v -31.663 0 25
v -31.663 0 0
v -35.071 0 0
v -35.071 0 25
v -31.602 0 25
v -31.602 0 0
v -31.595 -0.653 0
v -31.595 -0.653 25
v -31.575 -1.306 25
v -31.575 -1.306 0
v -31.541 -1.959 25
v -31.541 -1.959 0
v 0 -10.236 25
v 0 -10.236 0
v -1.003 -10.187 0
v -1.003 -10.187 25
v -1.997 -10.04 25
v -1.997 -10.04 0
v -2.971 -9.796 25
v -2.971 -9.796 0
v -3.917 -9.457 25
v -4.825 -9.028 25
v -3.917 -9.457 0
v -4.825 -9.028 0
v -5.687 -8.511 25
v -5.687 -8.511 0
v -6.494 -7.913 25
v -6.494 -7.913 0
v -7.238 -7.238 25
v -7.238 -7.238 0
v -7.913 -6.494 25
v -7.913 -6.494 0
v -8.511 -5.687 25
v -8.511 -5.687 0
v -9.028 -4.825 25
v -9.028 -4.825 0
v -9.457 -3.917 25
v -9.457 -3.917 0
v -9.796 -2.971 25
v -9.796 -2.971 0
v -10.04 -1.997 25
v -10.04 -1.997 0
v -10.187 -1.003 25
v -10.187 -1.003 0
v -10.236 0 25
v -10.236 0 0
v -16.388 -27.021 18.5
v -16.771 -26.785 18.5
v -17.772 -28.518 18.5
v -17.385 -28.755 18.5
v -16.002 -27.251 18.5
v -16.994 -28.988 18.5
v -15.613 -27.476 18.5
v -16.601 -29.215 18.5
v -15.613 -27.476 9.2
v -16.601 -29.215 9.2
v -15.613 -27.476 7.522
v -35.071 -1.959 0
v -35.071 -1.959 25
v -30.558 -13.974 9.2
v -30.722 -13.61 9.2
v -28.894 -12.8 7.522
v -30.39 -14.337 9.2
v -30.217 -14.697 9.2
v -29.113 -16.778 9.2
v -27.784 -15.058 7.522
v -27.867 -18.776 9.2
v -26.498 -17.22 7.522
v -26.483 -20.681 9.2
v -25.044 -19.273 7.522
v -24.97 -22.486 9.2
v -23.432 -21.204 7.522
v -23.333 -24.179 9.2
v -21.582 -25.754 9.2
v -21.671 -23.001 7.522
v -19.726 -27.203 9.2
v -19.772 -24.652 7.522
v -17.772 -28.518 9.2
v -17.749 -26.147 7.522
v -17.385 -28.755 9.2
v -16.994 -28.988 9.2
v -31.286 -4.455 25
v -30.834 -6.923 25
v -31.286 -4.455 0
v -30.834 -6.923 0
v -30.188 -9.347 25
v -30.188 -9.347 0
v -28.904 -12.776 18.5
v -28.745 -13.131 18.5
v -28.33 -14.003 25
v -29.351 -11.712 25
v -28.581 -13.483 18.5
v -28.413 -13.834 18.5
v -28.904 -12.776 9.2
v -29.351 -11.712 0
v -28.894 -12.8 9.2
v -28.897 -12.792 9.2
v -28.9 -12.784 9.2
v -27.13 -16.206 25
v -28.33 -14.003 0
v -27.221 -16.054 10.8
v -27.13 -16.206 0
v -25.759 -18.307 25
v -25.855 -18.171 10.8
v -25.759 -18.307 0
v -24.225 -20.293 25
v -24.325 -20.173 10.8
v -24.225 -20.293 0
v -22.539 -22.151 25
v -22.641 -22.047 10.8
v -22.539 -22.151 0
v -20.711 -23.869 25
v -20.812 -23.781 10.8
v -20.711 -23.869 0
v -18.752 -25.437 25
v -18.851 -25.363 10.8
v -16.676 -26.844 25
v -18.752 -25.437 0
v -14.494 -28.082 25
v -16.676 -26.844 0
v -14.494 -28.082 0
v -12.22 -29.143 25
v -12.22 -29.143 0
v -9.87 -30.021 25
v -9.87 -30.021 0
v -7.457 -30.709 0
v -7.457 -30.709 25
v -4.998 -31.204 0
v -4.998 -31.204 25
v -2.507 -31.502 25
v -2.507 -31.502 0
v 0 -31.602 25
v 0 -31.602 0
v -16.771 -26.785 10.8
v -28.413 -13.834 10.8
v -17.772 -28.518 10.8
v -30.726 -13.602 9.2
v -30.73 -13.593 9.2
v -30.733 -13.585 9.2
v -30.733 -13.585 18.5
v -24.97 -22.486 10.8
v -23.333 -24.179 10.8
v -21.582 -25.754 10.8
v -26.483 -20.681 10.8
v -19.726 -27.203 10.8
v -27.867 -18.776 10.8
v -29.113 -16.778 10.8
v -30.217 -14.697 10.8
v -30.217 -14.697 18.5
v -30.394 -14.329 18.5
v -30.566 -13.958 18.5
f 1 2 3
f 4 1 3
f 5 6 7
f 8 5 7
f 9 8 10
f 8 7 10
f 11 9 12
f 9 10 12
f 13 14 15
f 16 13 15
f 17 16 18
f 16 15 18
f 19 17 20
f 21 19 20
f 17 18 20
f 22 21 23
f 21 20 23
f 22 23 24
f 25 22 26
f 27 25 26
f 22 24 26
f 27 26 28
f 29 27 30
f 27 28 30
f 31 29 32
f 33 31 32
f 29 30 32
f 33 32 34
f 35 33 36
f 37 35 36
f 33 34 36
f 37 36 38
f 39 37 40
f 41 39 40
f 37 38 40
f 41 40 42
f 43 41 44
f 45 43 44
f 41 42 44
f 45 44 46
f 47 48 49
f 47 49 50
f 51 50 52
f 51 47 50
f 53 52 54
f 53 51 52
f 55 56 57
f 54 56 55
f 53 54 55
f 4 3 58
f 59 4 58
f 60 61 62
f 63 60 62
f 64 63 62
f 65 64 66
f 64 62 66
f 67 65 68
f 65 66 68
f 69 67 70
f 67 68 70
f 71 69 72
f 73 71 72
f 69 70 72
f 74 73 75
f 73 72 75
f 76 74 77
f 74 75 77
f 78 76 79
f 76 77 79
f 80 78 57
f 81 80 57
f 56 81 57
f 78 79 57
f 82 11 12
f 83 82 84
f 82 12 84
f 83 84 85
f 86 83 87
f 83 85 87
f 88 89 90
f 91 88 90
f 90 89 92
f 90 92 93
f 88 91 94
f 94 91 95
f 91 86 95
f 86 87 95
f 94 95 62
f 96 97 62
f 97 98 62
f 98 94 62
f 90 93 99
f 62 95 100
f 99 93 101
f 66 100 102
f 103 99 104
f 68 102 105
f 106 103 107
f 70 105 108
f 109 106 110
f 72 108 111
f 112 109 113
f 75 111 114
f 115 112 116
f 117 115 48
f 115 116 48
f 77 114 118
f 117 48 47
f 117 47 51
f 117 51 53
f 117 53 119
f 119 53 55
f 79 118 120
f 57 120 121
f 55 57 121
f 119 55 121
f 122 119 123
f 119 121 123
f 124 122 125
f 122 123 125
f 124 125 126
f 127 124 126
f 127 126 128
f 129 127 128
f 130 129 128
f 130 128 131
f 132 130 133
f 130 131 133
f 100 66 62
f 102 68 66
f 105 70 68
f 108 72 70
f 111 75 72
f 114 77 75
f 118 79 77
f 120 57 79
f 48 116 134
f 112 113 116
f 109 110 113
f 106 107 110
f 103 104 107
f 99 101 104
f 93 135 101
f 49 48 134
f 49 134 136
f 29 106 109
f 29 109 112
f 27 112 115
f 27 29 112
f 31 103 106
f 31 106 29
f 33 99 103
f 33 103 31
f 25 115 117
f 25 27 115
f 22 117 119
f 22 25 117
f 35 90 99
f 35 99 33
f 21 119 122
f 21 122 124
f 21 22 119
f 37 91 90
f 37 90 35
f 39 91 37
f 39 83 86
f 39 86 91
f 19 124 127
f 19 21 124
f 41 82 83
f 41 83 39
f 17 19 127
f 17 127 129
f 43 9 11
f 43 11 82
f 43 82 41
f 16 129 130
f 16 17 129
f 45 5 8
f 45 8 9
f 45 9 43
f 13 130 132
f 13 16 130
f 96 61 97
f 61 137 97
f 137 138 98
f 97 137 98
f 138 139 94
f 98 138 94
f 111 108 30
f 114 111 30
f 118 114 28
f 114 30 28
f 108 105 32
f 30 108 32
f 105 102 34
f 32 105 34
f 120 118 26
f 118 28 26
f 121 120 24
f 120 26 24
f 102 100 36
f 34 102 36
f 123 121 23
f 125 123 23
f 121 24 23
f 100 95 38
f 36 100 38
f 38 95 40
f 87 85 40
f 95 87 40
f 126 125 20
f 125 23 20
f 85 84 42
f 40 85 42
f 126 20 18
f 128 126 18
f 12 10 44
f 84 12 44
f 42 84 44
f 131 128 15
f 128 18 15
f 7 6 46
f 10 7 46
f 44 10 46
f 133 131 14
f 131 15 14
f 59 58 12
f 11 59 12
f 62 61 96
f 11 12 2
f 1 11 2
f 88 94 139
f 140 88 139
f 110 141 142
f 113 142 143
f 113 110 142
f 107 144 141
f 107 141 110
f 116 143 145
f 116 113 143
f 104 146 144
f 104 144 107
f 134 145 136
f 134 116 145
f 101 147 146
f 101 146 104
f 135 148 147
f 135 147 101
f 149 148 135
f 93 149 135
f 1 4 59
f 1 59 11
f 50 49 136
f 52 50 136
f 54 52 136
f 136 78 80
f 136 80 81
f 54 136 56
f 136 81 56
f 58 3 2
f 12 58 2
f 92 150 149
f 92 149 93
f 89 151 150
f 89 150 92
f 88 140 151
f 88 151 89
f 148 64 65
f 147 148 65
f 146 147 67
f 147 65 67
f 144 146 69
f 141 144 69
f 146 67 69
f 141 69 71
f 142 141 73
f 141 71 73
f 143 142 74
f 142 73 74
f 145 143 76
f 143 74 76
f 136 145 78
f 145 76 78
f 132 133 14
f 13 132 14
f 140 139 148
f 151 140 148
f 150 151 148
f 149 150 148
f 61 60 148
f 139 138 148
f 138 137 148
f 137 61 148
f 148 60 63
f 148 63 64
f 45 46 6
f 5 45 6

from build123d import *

# Parameters (mm, degrees)
F1_DEPTH       = 25
F4_DEPTH       = 1.6
F5_DEPTH       = 9.3
F8_ANGLE_START = 323.5
F8_ANGLE       = 36.5


# Not quite as in the source:
# - a feature names something its author has since deleted; it is built from what else it names


with BuildPart() as f1:
    # F0 (on Top) → F1 (new body)
    with BuildSketch(Plane.XY):
        Polygon((-31.6627237999, 0), (-35.0708141923, 0), (-35.0708141923, -1.9589243457), (-31.5410606563, -1.9589243457), align=None)
    extrude(amount=F1_DEPTH)


with BuildPart() as f1b:
    # F0 (on Top) → F1, piece 2 (new body)
    with BuildSketch(Plane.XY):
        with BuildLine():
            Line((-10.2362729305, 0), (-31.6018336797, 0))
            ThreePointArc((-31.6018336797, 0), (-31.5866367698, -0.97993341), (-31.5410606563, -1.9589243457))
            ThreePointArc((-31.5410606563, -1.9589243457), (-21.6422074955, -23.0280426142), (0, -31.6018336797))
            Line((0, -31.6018336797), (0, -10.2362729305))
            ThreePointArc((0, -10.2362729305), (-7.2381380033, -7.2381380033), (-10.2362729305, 0))
        make_face()
    extrude(amount=F1_DEPTH)

    # F3 (on offset) → F4 (join)
    with BuildSketch(Plane.XY.offset(9.2)):
        with BuildLine():
            Line((-28.9039363578, -12.7764766248), (-30.7331932706, -13.5850674651))
            ThreePointArc((-30.7331932706, -13.5850674651), (-30.4802346772, -14.1434974691), (-30.2171302851, -14.6972196))
            Line((-30.2171302851, -14.6972196), (-28.4130525281, -13.8338114038))
            ThreePointArc((-28.4130525281, -13.8338114038), (-28.66337023, -13.307407673), (-28.9039363578, -12.7764766248))
        make_face()
        with BuildLine():
            Line((-28.4130525281, -13.8338114038), (-30.2171302851, -14.6972196))
            ThreePointArc((-30.2171302851, -14.6972196), (-24.9696289489, -22.4855699681), (-17.771706088, -28.5175330167))
            Line((-17.771706088, -28.5175330167), (-16.7706750146, -26.7847036846))
            ThreePointArc((-16.7706750146, -26.7847036846), (-23.5015682749, -21.1270485524), (-28.4130525281, -13.8338114038))
        make_face()
        with BuildLine():
            Line((-16.7706750146, -26.7847036846), (-17.771706088, -28.5175330167))
            ThreePointArc((-17.771706088, -28.5175330167), (-17.1897915571, -28.8720330573), (-16.6008083436, -29.2146605144))
            Line((-16.6008083436, -29.2146605144), (-15.6127189136, -27.4757875236))
            ThreePointArc((-15.6127189136, -27.4757875236), (-16.1953835952, -27.1364227952), (-16.7706750146, -26.7847036846))
        make_face()
    extrude(amount=F4_DEPTH)

    # F3 (on offset) → F5 (join)
    with BuildSketch(Plane.XY.offset(9.2)):
        with BuildLine():
            Line((-16.7706750146, -26.7847036846), (-17.771706088, -28.5175330167))
            ThreePointArc((-17.771706088, -28.5175330167), (-17.1897915571, -28.8720330573), (-16.6008083436, -29.2146605144))
            Line((-16.6008083436, -29.2146605144), (-15.6127189136, -27.4757875236))
            ThreePointArc((-15.6127189136, -27.4757875236), (-16.1953835952, -27.1364227952), (-16.7706750146, -26.7847036846))
        make_face()
        with BuildLine():
            Line((-28.9039363578, -12.7764766248), (-30.7331932706, -13.5850674651))
            ThreePointArc((-30.7331932706, -13.5850674651), (-30.4802346772, -14.1434974691), (-30.2171302851, -14.6972196))
            Line((-30.2171302851, -14.6972196), (-28.4130525281, -13.8338114038))
            ThreePointArc((-28.4130525281, -13.8338114038), (-28.66337023, -13.307407673), (-28.9039363578, -12.7764766248))
        make_face()
    extrude(amount=F5_DEPTH)

    # F6 (on face) → F8 (revolve)
    with BuildSketch(Plane(origin=(0, 0, 0), x_dir=(0.494044715, 0.8694364954, 0), z_dir=(0.8694364954, -0.494044715, 0)), mode=Mode.PRIVATE) as f8_sk:
        Polygon((-31.6018336797, 9.2), (-33.6018336797, 9.2), (-31.6018336797, 7.5218007376), align=None)
    revolve(f8_sk.sketch.rotate(Axis((0, 0, 29.4944159687), (0, 0, 1)), F8_ANGLE_START), axis=Axis((0, 0, 29.4944159687), (0, 0, 1)), revolution_arc=F8_ANGLE)


solid = Compound([f1.part, f1b.part])
